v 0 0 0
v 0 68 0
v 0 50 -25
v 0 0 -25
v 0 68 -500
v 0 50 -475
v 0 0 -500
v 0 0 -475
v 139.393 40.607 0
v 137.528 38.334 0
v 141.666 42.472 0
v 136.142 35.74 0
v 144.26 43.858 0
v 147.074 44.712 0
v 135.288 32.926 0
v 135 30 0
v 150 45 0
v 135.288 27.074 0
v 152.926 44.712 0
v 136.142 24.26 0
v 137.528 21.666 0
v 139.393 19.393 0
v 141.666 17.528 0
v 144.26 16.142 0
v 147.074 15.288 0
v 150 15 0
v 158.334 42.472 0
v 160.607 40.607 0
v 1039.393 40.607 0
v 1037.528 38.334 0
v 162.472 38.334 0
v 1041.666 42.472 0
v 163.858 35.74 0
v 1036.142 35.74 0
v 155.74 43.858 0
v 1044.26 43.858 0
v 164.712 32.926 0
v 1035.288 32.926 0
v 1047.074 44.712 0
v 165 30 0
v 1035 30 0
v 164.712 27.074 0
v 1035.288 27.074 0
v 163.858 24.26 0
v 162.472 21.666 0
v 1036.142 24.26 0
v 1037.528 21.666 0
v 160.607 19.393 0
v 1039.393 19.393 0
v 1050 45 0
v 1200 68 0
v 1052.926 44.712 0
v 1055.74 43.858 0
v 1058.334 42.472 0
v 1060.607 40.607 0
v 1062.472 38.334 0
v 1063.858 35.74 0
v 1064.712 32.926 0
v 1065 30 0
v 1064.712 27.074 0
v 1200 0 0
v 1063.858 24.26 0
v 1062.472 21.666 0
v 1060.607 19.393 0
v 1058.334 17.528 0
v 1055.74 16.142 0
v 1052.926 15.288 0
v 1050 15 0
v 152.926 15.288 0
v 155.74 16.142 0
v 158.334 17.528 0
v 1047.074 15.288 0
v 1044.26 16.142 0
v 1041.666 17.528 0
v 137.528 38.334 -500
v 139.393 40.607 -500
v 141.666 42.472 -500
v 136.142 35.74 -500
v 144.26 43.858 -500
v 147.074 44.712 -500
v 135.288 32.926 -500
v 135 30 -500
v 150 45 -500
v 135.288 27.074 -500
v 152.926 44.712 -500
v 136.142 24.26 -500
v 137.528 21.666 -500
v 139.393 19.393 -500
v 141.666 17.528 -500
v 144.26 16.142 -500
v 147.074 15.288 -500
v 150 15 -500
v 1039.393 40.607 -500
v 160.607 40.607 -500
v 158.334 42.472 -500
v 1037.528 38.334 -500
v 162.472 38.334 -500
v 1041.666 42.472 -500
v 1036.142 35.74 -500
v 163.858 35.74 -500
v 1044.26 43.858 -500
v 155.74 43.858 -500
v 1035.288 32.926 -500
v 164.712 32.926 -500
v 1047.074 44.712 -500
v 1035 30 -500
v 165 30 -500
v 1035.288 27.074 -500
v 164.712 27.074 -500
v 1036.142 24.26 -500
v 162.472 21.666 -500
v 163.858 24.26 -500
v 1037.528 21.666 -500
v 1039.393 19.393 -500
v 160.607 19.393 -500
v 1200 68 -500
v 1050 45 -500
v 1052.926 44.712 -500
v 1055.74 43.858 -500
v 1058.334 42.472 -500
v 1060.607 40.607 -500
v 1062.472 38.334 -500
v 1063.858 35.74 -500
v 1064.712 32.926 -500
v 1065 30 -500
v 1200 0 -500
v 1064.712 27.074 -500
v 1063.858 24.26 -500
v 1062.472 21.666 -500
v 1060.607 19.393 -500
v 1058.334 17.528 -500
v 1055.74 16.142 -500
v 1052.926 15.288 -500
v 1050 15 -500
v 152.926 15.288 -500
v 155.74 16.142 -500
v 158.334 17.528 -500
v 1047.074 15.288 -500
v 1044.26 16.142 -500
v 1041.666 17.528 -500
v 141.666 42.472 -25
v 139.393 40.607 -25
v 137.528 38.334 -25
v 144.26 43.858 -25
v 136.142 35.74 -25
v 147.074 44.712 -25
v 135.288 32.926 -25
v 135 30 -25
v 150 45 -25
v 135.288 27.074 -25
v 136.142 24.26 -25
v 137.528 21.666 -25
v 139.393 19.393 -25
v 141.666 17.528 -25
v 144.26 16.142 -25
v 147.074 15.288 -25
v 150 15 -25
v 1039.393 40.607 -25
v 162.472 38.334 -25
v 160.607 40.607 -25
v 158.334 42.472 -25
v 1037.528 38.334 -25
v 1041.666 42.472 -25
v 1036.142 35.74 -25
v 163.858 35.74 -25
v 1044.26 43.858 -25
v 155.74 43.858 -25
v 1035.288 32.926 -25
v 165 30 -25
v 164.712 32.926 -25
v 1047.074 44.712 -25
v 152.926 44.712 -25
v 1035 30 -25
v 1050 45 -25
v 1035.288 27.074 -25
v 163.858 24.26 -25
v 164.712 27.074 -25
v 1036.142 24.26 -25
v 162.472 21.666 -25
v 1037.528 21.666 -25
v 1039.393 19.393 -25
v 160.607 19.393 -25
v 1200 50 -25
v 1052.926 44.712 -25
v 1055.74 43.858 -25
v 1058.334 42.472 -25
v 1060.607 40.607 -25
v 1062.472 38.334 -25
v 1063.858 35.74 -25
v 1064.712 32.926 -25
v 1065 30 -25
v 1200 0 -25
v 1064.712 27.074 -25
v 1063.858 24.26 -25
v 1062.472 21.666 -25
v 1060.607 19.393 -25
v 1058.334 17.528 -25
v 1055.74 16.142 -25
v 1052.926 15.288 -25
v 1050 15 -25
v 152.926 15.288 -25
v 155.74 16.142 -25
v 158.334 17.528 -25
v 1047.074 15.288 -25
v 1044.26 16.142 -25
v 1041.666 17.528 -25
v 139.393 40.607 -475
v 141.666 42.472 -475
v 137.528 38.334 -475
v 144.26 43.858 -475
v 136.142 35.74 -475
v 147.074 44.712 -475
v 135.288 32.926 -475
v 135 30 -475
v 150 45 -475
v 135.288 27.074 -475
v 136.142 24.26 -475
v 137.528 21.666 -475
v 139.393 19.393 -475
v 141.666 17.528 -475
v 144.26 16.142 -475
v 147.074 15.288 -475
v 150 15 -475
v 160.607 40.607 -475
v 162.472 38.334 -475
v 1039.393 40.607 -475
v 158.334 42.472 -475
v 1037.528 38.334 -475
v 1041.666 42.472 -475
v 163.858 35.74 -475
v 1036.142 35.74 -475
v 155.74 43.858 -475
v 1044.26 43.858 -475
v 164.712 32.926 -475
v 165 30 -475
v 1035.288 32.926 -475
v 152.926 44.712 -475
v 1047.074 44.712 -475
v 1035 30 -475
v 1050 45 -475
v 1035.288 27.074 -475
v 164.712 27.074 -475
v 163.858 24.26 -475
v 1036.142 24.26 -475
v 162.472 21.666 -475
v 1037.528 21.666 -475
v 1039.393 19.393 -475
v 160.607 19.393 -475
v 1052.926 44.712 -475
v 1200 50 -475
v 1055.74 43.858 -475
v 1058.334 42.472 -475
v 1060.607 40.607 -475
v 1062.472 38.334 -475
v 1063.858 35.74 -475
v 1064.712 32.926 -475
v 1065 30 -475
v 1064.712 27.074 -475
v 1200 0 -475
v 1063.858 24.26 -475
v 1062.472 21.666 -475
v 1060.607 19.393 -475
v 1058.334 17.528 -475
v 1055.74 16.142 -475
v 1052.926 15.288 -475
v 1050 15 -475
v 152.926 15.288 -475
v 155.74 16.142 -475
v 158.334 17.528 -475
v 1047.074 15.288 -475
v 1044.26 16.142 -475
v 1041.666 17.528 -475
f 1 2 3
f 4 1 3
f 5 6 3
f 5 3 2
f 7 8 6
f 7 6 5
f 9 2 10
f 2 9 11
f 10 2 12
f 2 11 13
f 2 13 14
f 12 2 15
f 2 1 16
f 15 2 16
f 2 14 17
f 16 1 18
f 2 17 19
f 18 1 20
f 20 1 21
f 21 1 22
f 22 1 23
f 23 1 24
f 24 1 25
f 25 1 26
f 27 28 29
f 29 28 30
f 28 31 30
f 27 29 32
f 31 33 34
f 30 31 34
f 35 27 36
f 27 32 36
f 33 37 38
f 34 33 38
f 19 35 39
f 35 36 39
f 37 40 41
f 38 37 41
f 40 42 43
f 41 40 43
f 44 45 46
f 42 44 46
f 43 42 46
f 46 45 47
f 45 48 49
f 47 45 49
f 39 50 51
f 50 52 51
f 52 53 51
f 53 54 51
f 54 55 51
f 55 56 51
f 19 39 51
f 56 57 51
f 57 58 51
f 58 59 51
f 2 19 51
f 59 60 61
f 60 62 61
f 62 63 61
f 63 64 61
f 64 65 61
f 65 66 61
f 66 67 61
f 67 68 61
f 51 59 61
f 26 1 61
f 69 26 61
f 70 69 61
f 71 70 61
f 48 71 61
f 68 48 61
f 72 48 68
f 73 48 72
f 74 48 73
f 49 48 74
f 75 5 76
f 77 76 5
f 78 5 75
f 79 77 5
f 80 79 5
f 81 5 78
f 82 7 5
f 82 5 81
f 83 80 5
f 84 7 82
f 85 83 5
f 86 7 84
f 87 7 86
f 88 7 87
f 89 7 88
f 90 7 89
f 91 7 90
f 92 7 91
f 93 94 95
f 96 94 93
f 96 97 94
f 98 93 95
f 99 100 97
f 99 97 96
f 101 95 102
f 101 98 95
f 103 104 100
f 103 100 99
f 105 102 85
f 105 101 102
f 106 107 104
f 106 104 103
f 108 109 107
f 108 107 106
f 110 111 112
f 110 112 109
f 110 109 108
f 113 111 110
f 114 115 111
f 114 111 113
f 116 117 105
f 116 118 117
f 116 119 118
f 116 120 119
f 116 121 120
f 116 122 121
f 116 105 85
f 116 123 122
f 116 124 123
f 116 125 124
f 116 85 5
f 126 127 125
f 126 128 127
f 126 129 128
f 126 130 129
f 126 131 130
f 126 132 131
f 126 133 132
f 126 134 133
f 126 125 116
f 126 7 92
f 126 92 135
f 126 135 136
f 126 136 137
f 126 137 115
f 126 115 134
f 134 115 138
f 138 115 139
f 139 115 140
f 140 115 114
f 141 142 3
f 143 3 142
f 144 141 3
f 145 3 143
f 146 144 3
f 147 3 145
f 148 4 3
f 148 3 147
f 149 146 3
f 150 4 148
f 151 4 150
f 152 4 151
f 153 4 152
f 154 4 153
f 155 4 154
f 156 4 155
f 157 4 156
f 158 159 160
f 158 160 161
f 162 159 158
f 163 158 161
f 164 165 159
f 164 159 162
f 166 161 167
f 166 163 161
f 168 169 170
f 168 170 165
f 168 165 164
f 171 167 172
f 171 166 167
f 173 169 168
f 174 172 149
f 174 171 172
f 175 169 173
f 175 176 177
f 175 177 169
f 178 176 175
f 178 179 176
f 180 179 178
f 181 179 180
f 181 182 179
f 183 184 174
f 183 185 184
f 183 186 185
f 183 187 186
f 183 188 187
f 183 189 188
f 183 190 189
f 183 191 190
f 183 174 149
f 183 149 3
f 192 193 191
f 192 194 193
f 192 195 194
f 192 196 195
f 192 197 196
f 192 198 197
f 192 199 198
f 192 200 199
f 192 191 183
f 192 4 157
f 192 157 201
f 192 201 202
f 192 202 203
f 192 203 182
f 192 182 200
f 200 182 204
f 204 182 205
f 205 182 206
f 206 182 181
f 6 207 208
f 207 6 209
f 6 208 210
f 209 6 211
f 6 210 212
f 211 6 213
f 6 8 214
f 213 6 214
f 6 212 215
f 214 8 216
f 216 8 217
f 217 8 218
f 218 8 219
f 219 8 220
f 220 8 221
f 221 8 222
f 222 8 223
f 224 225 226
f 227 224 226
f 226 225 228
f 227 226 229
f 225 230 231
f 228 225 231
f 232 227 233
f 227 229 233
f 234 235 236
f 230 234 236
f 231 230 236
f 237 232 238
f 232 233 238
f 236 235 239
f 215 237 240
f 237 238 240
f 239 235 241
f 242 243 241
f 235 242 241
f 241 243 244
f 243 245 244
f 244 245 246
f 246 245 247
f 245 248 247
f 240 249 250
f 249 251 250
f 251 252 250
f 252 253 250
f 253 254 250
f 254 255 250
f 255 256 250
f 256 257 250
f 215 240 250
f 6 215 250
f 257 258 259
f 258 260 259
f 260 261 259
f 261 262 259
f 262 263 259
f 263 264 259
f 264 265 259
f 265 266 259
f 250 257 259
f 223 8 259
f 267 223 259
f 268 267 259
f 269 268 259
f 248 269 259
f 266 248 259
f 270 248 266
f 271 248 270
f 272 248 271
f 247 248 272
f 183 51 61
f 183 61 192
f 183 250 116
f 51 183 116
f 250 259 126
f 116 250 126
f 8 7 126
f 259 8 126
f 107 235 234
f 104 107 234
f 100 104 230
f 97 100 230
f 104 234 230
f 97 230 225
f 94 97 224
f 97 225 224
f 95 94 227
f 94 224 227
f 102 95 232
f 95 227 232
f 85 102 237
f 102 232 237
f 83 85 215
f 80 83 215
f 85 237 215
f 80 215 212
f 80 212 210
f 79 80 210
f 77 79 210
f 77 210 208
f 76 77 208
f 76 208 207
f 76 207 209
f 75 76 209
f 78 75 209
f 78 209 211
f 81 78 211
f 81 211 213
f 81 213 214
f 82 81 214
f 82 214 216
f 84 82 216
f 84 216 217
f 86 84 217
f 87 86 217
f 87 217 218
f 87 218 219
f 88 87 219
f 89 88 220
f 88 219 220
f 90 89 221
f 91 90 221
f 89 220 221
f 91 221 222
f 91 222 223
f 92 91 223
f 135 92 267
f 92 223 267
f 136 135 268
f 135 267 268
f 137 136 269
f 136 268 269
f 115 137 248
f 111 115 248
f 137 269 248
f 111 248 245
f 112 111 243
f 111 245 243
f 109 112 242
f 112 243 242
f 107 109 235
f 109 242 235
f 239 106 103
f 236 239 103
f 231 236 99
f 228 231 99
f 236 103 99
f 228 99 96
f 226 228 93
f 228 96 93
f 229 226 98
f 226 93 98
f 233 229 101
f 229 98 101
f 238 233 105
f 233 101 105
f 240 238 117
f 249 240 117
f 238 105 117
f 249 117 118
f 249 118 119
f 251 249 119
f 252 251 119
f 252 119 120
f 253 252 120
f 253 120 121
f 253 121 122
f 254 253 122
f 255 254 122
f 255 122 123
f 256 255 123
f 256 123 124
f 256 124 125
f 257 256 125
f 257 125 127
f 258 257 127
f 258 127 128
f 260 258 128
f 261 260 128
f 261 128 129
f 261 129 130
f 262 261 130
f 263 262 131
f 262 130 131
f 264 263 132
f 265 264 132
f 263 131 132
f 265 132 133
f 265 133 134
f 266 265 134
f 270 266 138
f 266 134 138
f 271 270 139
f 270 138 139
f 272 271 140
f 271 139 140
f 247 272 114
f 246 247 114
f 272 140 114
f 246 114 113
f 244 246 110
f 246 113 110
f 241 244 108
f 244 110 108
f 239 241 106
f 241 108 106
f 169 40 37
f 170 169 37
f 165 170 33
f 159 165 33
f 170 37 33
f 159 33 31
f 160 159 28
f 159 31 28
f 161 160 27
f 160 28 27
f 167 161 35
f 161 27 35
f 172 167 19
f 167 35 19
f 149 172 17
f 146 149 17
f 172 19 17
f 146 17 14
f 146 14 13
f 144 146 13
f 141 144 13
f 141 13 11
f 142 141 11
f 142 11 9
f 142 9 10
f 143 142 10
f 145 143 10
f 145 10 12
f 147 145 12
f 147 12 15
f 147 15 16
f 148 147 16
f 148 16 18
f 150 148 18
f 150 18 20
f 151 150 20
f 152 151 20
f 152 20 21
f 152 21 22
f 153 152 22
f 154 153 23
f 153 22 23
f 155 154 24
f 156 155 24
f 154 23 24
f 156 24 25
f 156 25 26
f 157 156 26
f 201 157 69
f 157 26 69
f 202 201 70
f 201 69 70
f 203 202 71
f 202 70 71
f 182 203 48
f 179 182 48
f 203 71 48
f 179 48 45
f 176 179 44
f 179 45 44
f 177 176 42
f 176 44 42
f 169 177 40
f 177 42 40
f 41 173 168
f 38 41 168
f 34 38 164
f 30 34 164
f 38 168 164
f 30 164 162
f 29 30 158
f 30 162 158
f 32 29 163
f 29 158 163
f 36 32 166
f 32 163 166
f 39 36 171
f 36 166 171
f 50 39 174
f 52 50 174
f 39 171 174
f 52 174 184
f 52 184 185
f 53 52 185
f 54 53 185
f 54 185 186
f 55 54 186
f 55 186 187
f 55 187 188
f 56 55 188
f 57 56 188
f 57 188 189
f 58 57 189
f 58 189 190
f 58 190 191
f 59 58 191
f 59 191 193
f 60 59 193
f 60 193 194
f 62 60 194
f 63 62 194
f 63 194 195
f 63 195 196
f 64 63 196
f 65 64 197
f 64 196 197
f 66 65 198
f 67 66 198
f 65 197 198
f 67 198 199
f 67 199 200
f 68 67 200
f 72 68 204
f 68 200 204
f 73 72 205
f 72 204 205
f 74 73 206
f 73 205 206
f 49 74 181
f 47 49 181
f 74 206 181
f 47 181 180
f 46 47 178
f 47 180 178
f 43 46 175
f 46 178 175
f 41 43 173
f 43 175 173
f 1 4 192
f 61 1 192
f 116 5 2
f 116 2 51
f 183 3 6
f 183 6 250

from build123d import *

# Parameters (mm, degrees)
SKETCH1_W           = 1200
SKETCH1_H           = 500
BOSS_EXTRUDE1_DEPTH = 68
SKETCH3_R           = 15
CUT_EXTRUDE2_DEPTH  = 1302.77724669
SKETCH4_R           = 15
CUT_EXTRUDE3_DEPTH  = 1302.77724669
SKETCH2_W           = 1200
SKETCH2_H           = 450
CUT_EXTRUDE1_DEPTH  = 50


with BuildPart() as part:
    # Sketch1 → Boss-Extrude1 (new body)
    with BuildSketch(Plane(origin=(0, 0, 0), x_dir=(1, 0, 0), z_dir=(0, 1, 0))):
        with Locations((600, 250)):
            Rectangle(SKETCH1_W, SKETCH1_H)
    extrude(amount=BOSS_EXTRUDE1_DEPTH)

    # Sketch3 → Cut-Extrude2 (cut, through all)
    with BuildSketch(Plane.XY):
        with Locations((150, 30)):
            Circle(SKETCH3_R)
    extrude(amount=-CUT_EXTRUDE2_DEPTH, mode=Mode.SUBTRACT)

    # Sketch4 → Cut-Extrude3 (cut, through all)
    with BuildSketch(Plane(origin=(0, 0, -500), x_dir=(-1, 0, 0), z_dir=(0, 0, -1))):
        with Locations((-1050, 30)):
            Circle(SKETCH4_R)
    extrude(amount=-CUT_EXTRUDE3_DEPTH, mode=Mode.SUBTRACT)

    # Sketch2 → Cut-Extrude1 (cut)
    with BuildSketch(Plane.XZ):
        with Locations((600, -250)):
            Rectangle(SKETCH2_W, SKETCH2_H)
    extrude(amount=-CUT_EXTRUDE1_DEPTH, mode=Mode.SUBTRACT)


solid = part.part
